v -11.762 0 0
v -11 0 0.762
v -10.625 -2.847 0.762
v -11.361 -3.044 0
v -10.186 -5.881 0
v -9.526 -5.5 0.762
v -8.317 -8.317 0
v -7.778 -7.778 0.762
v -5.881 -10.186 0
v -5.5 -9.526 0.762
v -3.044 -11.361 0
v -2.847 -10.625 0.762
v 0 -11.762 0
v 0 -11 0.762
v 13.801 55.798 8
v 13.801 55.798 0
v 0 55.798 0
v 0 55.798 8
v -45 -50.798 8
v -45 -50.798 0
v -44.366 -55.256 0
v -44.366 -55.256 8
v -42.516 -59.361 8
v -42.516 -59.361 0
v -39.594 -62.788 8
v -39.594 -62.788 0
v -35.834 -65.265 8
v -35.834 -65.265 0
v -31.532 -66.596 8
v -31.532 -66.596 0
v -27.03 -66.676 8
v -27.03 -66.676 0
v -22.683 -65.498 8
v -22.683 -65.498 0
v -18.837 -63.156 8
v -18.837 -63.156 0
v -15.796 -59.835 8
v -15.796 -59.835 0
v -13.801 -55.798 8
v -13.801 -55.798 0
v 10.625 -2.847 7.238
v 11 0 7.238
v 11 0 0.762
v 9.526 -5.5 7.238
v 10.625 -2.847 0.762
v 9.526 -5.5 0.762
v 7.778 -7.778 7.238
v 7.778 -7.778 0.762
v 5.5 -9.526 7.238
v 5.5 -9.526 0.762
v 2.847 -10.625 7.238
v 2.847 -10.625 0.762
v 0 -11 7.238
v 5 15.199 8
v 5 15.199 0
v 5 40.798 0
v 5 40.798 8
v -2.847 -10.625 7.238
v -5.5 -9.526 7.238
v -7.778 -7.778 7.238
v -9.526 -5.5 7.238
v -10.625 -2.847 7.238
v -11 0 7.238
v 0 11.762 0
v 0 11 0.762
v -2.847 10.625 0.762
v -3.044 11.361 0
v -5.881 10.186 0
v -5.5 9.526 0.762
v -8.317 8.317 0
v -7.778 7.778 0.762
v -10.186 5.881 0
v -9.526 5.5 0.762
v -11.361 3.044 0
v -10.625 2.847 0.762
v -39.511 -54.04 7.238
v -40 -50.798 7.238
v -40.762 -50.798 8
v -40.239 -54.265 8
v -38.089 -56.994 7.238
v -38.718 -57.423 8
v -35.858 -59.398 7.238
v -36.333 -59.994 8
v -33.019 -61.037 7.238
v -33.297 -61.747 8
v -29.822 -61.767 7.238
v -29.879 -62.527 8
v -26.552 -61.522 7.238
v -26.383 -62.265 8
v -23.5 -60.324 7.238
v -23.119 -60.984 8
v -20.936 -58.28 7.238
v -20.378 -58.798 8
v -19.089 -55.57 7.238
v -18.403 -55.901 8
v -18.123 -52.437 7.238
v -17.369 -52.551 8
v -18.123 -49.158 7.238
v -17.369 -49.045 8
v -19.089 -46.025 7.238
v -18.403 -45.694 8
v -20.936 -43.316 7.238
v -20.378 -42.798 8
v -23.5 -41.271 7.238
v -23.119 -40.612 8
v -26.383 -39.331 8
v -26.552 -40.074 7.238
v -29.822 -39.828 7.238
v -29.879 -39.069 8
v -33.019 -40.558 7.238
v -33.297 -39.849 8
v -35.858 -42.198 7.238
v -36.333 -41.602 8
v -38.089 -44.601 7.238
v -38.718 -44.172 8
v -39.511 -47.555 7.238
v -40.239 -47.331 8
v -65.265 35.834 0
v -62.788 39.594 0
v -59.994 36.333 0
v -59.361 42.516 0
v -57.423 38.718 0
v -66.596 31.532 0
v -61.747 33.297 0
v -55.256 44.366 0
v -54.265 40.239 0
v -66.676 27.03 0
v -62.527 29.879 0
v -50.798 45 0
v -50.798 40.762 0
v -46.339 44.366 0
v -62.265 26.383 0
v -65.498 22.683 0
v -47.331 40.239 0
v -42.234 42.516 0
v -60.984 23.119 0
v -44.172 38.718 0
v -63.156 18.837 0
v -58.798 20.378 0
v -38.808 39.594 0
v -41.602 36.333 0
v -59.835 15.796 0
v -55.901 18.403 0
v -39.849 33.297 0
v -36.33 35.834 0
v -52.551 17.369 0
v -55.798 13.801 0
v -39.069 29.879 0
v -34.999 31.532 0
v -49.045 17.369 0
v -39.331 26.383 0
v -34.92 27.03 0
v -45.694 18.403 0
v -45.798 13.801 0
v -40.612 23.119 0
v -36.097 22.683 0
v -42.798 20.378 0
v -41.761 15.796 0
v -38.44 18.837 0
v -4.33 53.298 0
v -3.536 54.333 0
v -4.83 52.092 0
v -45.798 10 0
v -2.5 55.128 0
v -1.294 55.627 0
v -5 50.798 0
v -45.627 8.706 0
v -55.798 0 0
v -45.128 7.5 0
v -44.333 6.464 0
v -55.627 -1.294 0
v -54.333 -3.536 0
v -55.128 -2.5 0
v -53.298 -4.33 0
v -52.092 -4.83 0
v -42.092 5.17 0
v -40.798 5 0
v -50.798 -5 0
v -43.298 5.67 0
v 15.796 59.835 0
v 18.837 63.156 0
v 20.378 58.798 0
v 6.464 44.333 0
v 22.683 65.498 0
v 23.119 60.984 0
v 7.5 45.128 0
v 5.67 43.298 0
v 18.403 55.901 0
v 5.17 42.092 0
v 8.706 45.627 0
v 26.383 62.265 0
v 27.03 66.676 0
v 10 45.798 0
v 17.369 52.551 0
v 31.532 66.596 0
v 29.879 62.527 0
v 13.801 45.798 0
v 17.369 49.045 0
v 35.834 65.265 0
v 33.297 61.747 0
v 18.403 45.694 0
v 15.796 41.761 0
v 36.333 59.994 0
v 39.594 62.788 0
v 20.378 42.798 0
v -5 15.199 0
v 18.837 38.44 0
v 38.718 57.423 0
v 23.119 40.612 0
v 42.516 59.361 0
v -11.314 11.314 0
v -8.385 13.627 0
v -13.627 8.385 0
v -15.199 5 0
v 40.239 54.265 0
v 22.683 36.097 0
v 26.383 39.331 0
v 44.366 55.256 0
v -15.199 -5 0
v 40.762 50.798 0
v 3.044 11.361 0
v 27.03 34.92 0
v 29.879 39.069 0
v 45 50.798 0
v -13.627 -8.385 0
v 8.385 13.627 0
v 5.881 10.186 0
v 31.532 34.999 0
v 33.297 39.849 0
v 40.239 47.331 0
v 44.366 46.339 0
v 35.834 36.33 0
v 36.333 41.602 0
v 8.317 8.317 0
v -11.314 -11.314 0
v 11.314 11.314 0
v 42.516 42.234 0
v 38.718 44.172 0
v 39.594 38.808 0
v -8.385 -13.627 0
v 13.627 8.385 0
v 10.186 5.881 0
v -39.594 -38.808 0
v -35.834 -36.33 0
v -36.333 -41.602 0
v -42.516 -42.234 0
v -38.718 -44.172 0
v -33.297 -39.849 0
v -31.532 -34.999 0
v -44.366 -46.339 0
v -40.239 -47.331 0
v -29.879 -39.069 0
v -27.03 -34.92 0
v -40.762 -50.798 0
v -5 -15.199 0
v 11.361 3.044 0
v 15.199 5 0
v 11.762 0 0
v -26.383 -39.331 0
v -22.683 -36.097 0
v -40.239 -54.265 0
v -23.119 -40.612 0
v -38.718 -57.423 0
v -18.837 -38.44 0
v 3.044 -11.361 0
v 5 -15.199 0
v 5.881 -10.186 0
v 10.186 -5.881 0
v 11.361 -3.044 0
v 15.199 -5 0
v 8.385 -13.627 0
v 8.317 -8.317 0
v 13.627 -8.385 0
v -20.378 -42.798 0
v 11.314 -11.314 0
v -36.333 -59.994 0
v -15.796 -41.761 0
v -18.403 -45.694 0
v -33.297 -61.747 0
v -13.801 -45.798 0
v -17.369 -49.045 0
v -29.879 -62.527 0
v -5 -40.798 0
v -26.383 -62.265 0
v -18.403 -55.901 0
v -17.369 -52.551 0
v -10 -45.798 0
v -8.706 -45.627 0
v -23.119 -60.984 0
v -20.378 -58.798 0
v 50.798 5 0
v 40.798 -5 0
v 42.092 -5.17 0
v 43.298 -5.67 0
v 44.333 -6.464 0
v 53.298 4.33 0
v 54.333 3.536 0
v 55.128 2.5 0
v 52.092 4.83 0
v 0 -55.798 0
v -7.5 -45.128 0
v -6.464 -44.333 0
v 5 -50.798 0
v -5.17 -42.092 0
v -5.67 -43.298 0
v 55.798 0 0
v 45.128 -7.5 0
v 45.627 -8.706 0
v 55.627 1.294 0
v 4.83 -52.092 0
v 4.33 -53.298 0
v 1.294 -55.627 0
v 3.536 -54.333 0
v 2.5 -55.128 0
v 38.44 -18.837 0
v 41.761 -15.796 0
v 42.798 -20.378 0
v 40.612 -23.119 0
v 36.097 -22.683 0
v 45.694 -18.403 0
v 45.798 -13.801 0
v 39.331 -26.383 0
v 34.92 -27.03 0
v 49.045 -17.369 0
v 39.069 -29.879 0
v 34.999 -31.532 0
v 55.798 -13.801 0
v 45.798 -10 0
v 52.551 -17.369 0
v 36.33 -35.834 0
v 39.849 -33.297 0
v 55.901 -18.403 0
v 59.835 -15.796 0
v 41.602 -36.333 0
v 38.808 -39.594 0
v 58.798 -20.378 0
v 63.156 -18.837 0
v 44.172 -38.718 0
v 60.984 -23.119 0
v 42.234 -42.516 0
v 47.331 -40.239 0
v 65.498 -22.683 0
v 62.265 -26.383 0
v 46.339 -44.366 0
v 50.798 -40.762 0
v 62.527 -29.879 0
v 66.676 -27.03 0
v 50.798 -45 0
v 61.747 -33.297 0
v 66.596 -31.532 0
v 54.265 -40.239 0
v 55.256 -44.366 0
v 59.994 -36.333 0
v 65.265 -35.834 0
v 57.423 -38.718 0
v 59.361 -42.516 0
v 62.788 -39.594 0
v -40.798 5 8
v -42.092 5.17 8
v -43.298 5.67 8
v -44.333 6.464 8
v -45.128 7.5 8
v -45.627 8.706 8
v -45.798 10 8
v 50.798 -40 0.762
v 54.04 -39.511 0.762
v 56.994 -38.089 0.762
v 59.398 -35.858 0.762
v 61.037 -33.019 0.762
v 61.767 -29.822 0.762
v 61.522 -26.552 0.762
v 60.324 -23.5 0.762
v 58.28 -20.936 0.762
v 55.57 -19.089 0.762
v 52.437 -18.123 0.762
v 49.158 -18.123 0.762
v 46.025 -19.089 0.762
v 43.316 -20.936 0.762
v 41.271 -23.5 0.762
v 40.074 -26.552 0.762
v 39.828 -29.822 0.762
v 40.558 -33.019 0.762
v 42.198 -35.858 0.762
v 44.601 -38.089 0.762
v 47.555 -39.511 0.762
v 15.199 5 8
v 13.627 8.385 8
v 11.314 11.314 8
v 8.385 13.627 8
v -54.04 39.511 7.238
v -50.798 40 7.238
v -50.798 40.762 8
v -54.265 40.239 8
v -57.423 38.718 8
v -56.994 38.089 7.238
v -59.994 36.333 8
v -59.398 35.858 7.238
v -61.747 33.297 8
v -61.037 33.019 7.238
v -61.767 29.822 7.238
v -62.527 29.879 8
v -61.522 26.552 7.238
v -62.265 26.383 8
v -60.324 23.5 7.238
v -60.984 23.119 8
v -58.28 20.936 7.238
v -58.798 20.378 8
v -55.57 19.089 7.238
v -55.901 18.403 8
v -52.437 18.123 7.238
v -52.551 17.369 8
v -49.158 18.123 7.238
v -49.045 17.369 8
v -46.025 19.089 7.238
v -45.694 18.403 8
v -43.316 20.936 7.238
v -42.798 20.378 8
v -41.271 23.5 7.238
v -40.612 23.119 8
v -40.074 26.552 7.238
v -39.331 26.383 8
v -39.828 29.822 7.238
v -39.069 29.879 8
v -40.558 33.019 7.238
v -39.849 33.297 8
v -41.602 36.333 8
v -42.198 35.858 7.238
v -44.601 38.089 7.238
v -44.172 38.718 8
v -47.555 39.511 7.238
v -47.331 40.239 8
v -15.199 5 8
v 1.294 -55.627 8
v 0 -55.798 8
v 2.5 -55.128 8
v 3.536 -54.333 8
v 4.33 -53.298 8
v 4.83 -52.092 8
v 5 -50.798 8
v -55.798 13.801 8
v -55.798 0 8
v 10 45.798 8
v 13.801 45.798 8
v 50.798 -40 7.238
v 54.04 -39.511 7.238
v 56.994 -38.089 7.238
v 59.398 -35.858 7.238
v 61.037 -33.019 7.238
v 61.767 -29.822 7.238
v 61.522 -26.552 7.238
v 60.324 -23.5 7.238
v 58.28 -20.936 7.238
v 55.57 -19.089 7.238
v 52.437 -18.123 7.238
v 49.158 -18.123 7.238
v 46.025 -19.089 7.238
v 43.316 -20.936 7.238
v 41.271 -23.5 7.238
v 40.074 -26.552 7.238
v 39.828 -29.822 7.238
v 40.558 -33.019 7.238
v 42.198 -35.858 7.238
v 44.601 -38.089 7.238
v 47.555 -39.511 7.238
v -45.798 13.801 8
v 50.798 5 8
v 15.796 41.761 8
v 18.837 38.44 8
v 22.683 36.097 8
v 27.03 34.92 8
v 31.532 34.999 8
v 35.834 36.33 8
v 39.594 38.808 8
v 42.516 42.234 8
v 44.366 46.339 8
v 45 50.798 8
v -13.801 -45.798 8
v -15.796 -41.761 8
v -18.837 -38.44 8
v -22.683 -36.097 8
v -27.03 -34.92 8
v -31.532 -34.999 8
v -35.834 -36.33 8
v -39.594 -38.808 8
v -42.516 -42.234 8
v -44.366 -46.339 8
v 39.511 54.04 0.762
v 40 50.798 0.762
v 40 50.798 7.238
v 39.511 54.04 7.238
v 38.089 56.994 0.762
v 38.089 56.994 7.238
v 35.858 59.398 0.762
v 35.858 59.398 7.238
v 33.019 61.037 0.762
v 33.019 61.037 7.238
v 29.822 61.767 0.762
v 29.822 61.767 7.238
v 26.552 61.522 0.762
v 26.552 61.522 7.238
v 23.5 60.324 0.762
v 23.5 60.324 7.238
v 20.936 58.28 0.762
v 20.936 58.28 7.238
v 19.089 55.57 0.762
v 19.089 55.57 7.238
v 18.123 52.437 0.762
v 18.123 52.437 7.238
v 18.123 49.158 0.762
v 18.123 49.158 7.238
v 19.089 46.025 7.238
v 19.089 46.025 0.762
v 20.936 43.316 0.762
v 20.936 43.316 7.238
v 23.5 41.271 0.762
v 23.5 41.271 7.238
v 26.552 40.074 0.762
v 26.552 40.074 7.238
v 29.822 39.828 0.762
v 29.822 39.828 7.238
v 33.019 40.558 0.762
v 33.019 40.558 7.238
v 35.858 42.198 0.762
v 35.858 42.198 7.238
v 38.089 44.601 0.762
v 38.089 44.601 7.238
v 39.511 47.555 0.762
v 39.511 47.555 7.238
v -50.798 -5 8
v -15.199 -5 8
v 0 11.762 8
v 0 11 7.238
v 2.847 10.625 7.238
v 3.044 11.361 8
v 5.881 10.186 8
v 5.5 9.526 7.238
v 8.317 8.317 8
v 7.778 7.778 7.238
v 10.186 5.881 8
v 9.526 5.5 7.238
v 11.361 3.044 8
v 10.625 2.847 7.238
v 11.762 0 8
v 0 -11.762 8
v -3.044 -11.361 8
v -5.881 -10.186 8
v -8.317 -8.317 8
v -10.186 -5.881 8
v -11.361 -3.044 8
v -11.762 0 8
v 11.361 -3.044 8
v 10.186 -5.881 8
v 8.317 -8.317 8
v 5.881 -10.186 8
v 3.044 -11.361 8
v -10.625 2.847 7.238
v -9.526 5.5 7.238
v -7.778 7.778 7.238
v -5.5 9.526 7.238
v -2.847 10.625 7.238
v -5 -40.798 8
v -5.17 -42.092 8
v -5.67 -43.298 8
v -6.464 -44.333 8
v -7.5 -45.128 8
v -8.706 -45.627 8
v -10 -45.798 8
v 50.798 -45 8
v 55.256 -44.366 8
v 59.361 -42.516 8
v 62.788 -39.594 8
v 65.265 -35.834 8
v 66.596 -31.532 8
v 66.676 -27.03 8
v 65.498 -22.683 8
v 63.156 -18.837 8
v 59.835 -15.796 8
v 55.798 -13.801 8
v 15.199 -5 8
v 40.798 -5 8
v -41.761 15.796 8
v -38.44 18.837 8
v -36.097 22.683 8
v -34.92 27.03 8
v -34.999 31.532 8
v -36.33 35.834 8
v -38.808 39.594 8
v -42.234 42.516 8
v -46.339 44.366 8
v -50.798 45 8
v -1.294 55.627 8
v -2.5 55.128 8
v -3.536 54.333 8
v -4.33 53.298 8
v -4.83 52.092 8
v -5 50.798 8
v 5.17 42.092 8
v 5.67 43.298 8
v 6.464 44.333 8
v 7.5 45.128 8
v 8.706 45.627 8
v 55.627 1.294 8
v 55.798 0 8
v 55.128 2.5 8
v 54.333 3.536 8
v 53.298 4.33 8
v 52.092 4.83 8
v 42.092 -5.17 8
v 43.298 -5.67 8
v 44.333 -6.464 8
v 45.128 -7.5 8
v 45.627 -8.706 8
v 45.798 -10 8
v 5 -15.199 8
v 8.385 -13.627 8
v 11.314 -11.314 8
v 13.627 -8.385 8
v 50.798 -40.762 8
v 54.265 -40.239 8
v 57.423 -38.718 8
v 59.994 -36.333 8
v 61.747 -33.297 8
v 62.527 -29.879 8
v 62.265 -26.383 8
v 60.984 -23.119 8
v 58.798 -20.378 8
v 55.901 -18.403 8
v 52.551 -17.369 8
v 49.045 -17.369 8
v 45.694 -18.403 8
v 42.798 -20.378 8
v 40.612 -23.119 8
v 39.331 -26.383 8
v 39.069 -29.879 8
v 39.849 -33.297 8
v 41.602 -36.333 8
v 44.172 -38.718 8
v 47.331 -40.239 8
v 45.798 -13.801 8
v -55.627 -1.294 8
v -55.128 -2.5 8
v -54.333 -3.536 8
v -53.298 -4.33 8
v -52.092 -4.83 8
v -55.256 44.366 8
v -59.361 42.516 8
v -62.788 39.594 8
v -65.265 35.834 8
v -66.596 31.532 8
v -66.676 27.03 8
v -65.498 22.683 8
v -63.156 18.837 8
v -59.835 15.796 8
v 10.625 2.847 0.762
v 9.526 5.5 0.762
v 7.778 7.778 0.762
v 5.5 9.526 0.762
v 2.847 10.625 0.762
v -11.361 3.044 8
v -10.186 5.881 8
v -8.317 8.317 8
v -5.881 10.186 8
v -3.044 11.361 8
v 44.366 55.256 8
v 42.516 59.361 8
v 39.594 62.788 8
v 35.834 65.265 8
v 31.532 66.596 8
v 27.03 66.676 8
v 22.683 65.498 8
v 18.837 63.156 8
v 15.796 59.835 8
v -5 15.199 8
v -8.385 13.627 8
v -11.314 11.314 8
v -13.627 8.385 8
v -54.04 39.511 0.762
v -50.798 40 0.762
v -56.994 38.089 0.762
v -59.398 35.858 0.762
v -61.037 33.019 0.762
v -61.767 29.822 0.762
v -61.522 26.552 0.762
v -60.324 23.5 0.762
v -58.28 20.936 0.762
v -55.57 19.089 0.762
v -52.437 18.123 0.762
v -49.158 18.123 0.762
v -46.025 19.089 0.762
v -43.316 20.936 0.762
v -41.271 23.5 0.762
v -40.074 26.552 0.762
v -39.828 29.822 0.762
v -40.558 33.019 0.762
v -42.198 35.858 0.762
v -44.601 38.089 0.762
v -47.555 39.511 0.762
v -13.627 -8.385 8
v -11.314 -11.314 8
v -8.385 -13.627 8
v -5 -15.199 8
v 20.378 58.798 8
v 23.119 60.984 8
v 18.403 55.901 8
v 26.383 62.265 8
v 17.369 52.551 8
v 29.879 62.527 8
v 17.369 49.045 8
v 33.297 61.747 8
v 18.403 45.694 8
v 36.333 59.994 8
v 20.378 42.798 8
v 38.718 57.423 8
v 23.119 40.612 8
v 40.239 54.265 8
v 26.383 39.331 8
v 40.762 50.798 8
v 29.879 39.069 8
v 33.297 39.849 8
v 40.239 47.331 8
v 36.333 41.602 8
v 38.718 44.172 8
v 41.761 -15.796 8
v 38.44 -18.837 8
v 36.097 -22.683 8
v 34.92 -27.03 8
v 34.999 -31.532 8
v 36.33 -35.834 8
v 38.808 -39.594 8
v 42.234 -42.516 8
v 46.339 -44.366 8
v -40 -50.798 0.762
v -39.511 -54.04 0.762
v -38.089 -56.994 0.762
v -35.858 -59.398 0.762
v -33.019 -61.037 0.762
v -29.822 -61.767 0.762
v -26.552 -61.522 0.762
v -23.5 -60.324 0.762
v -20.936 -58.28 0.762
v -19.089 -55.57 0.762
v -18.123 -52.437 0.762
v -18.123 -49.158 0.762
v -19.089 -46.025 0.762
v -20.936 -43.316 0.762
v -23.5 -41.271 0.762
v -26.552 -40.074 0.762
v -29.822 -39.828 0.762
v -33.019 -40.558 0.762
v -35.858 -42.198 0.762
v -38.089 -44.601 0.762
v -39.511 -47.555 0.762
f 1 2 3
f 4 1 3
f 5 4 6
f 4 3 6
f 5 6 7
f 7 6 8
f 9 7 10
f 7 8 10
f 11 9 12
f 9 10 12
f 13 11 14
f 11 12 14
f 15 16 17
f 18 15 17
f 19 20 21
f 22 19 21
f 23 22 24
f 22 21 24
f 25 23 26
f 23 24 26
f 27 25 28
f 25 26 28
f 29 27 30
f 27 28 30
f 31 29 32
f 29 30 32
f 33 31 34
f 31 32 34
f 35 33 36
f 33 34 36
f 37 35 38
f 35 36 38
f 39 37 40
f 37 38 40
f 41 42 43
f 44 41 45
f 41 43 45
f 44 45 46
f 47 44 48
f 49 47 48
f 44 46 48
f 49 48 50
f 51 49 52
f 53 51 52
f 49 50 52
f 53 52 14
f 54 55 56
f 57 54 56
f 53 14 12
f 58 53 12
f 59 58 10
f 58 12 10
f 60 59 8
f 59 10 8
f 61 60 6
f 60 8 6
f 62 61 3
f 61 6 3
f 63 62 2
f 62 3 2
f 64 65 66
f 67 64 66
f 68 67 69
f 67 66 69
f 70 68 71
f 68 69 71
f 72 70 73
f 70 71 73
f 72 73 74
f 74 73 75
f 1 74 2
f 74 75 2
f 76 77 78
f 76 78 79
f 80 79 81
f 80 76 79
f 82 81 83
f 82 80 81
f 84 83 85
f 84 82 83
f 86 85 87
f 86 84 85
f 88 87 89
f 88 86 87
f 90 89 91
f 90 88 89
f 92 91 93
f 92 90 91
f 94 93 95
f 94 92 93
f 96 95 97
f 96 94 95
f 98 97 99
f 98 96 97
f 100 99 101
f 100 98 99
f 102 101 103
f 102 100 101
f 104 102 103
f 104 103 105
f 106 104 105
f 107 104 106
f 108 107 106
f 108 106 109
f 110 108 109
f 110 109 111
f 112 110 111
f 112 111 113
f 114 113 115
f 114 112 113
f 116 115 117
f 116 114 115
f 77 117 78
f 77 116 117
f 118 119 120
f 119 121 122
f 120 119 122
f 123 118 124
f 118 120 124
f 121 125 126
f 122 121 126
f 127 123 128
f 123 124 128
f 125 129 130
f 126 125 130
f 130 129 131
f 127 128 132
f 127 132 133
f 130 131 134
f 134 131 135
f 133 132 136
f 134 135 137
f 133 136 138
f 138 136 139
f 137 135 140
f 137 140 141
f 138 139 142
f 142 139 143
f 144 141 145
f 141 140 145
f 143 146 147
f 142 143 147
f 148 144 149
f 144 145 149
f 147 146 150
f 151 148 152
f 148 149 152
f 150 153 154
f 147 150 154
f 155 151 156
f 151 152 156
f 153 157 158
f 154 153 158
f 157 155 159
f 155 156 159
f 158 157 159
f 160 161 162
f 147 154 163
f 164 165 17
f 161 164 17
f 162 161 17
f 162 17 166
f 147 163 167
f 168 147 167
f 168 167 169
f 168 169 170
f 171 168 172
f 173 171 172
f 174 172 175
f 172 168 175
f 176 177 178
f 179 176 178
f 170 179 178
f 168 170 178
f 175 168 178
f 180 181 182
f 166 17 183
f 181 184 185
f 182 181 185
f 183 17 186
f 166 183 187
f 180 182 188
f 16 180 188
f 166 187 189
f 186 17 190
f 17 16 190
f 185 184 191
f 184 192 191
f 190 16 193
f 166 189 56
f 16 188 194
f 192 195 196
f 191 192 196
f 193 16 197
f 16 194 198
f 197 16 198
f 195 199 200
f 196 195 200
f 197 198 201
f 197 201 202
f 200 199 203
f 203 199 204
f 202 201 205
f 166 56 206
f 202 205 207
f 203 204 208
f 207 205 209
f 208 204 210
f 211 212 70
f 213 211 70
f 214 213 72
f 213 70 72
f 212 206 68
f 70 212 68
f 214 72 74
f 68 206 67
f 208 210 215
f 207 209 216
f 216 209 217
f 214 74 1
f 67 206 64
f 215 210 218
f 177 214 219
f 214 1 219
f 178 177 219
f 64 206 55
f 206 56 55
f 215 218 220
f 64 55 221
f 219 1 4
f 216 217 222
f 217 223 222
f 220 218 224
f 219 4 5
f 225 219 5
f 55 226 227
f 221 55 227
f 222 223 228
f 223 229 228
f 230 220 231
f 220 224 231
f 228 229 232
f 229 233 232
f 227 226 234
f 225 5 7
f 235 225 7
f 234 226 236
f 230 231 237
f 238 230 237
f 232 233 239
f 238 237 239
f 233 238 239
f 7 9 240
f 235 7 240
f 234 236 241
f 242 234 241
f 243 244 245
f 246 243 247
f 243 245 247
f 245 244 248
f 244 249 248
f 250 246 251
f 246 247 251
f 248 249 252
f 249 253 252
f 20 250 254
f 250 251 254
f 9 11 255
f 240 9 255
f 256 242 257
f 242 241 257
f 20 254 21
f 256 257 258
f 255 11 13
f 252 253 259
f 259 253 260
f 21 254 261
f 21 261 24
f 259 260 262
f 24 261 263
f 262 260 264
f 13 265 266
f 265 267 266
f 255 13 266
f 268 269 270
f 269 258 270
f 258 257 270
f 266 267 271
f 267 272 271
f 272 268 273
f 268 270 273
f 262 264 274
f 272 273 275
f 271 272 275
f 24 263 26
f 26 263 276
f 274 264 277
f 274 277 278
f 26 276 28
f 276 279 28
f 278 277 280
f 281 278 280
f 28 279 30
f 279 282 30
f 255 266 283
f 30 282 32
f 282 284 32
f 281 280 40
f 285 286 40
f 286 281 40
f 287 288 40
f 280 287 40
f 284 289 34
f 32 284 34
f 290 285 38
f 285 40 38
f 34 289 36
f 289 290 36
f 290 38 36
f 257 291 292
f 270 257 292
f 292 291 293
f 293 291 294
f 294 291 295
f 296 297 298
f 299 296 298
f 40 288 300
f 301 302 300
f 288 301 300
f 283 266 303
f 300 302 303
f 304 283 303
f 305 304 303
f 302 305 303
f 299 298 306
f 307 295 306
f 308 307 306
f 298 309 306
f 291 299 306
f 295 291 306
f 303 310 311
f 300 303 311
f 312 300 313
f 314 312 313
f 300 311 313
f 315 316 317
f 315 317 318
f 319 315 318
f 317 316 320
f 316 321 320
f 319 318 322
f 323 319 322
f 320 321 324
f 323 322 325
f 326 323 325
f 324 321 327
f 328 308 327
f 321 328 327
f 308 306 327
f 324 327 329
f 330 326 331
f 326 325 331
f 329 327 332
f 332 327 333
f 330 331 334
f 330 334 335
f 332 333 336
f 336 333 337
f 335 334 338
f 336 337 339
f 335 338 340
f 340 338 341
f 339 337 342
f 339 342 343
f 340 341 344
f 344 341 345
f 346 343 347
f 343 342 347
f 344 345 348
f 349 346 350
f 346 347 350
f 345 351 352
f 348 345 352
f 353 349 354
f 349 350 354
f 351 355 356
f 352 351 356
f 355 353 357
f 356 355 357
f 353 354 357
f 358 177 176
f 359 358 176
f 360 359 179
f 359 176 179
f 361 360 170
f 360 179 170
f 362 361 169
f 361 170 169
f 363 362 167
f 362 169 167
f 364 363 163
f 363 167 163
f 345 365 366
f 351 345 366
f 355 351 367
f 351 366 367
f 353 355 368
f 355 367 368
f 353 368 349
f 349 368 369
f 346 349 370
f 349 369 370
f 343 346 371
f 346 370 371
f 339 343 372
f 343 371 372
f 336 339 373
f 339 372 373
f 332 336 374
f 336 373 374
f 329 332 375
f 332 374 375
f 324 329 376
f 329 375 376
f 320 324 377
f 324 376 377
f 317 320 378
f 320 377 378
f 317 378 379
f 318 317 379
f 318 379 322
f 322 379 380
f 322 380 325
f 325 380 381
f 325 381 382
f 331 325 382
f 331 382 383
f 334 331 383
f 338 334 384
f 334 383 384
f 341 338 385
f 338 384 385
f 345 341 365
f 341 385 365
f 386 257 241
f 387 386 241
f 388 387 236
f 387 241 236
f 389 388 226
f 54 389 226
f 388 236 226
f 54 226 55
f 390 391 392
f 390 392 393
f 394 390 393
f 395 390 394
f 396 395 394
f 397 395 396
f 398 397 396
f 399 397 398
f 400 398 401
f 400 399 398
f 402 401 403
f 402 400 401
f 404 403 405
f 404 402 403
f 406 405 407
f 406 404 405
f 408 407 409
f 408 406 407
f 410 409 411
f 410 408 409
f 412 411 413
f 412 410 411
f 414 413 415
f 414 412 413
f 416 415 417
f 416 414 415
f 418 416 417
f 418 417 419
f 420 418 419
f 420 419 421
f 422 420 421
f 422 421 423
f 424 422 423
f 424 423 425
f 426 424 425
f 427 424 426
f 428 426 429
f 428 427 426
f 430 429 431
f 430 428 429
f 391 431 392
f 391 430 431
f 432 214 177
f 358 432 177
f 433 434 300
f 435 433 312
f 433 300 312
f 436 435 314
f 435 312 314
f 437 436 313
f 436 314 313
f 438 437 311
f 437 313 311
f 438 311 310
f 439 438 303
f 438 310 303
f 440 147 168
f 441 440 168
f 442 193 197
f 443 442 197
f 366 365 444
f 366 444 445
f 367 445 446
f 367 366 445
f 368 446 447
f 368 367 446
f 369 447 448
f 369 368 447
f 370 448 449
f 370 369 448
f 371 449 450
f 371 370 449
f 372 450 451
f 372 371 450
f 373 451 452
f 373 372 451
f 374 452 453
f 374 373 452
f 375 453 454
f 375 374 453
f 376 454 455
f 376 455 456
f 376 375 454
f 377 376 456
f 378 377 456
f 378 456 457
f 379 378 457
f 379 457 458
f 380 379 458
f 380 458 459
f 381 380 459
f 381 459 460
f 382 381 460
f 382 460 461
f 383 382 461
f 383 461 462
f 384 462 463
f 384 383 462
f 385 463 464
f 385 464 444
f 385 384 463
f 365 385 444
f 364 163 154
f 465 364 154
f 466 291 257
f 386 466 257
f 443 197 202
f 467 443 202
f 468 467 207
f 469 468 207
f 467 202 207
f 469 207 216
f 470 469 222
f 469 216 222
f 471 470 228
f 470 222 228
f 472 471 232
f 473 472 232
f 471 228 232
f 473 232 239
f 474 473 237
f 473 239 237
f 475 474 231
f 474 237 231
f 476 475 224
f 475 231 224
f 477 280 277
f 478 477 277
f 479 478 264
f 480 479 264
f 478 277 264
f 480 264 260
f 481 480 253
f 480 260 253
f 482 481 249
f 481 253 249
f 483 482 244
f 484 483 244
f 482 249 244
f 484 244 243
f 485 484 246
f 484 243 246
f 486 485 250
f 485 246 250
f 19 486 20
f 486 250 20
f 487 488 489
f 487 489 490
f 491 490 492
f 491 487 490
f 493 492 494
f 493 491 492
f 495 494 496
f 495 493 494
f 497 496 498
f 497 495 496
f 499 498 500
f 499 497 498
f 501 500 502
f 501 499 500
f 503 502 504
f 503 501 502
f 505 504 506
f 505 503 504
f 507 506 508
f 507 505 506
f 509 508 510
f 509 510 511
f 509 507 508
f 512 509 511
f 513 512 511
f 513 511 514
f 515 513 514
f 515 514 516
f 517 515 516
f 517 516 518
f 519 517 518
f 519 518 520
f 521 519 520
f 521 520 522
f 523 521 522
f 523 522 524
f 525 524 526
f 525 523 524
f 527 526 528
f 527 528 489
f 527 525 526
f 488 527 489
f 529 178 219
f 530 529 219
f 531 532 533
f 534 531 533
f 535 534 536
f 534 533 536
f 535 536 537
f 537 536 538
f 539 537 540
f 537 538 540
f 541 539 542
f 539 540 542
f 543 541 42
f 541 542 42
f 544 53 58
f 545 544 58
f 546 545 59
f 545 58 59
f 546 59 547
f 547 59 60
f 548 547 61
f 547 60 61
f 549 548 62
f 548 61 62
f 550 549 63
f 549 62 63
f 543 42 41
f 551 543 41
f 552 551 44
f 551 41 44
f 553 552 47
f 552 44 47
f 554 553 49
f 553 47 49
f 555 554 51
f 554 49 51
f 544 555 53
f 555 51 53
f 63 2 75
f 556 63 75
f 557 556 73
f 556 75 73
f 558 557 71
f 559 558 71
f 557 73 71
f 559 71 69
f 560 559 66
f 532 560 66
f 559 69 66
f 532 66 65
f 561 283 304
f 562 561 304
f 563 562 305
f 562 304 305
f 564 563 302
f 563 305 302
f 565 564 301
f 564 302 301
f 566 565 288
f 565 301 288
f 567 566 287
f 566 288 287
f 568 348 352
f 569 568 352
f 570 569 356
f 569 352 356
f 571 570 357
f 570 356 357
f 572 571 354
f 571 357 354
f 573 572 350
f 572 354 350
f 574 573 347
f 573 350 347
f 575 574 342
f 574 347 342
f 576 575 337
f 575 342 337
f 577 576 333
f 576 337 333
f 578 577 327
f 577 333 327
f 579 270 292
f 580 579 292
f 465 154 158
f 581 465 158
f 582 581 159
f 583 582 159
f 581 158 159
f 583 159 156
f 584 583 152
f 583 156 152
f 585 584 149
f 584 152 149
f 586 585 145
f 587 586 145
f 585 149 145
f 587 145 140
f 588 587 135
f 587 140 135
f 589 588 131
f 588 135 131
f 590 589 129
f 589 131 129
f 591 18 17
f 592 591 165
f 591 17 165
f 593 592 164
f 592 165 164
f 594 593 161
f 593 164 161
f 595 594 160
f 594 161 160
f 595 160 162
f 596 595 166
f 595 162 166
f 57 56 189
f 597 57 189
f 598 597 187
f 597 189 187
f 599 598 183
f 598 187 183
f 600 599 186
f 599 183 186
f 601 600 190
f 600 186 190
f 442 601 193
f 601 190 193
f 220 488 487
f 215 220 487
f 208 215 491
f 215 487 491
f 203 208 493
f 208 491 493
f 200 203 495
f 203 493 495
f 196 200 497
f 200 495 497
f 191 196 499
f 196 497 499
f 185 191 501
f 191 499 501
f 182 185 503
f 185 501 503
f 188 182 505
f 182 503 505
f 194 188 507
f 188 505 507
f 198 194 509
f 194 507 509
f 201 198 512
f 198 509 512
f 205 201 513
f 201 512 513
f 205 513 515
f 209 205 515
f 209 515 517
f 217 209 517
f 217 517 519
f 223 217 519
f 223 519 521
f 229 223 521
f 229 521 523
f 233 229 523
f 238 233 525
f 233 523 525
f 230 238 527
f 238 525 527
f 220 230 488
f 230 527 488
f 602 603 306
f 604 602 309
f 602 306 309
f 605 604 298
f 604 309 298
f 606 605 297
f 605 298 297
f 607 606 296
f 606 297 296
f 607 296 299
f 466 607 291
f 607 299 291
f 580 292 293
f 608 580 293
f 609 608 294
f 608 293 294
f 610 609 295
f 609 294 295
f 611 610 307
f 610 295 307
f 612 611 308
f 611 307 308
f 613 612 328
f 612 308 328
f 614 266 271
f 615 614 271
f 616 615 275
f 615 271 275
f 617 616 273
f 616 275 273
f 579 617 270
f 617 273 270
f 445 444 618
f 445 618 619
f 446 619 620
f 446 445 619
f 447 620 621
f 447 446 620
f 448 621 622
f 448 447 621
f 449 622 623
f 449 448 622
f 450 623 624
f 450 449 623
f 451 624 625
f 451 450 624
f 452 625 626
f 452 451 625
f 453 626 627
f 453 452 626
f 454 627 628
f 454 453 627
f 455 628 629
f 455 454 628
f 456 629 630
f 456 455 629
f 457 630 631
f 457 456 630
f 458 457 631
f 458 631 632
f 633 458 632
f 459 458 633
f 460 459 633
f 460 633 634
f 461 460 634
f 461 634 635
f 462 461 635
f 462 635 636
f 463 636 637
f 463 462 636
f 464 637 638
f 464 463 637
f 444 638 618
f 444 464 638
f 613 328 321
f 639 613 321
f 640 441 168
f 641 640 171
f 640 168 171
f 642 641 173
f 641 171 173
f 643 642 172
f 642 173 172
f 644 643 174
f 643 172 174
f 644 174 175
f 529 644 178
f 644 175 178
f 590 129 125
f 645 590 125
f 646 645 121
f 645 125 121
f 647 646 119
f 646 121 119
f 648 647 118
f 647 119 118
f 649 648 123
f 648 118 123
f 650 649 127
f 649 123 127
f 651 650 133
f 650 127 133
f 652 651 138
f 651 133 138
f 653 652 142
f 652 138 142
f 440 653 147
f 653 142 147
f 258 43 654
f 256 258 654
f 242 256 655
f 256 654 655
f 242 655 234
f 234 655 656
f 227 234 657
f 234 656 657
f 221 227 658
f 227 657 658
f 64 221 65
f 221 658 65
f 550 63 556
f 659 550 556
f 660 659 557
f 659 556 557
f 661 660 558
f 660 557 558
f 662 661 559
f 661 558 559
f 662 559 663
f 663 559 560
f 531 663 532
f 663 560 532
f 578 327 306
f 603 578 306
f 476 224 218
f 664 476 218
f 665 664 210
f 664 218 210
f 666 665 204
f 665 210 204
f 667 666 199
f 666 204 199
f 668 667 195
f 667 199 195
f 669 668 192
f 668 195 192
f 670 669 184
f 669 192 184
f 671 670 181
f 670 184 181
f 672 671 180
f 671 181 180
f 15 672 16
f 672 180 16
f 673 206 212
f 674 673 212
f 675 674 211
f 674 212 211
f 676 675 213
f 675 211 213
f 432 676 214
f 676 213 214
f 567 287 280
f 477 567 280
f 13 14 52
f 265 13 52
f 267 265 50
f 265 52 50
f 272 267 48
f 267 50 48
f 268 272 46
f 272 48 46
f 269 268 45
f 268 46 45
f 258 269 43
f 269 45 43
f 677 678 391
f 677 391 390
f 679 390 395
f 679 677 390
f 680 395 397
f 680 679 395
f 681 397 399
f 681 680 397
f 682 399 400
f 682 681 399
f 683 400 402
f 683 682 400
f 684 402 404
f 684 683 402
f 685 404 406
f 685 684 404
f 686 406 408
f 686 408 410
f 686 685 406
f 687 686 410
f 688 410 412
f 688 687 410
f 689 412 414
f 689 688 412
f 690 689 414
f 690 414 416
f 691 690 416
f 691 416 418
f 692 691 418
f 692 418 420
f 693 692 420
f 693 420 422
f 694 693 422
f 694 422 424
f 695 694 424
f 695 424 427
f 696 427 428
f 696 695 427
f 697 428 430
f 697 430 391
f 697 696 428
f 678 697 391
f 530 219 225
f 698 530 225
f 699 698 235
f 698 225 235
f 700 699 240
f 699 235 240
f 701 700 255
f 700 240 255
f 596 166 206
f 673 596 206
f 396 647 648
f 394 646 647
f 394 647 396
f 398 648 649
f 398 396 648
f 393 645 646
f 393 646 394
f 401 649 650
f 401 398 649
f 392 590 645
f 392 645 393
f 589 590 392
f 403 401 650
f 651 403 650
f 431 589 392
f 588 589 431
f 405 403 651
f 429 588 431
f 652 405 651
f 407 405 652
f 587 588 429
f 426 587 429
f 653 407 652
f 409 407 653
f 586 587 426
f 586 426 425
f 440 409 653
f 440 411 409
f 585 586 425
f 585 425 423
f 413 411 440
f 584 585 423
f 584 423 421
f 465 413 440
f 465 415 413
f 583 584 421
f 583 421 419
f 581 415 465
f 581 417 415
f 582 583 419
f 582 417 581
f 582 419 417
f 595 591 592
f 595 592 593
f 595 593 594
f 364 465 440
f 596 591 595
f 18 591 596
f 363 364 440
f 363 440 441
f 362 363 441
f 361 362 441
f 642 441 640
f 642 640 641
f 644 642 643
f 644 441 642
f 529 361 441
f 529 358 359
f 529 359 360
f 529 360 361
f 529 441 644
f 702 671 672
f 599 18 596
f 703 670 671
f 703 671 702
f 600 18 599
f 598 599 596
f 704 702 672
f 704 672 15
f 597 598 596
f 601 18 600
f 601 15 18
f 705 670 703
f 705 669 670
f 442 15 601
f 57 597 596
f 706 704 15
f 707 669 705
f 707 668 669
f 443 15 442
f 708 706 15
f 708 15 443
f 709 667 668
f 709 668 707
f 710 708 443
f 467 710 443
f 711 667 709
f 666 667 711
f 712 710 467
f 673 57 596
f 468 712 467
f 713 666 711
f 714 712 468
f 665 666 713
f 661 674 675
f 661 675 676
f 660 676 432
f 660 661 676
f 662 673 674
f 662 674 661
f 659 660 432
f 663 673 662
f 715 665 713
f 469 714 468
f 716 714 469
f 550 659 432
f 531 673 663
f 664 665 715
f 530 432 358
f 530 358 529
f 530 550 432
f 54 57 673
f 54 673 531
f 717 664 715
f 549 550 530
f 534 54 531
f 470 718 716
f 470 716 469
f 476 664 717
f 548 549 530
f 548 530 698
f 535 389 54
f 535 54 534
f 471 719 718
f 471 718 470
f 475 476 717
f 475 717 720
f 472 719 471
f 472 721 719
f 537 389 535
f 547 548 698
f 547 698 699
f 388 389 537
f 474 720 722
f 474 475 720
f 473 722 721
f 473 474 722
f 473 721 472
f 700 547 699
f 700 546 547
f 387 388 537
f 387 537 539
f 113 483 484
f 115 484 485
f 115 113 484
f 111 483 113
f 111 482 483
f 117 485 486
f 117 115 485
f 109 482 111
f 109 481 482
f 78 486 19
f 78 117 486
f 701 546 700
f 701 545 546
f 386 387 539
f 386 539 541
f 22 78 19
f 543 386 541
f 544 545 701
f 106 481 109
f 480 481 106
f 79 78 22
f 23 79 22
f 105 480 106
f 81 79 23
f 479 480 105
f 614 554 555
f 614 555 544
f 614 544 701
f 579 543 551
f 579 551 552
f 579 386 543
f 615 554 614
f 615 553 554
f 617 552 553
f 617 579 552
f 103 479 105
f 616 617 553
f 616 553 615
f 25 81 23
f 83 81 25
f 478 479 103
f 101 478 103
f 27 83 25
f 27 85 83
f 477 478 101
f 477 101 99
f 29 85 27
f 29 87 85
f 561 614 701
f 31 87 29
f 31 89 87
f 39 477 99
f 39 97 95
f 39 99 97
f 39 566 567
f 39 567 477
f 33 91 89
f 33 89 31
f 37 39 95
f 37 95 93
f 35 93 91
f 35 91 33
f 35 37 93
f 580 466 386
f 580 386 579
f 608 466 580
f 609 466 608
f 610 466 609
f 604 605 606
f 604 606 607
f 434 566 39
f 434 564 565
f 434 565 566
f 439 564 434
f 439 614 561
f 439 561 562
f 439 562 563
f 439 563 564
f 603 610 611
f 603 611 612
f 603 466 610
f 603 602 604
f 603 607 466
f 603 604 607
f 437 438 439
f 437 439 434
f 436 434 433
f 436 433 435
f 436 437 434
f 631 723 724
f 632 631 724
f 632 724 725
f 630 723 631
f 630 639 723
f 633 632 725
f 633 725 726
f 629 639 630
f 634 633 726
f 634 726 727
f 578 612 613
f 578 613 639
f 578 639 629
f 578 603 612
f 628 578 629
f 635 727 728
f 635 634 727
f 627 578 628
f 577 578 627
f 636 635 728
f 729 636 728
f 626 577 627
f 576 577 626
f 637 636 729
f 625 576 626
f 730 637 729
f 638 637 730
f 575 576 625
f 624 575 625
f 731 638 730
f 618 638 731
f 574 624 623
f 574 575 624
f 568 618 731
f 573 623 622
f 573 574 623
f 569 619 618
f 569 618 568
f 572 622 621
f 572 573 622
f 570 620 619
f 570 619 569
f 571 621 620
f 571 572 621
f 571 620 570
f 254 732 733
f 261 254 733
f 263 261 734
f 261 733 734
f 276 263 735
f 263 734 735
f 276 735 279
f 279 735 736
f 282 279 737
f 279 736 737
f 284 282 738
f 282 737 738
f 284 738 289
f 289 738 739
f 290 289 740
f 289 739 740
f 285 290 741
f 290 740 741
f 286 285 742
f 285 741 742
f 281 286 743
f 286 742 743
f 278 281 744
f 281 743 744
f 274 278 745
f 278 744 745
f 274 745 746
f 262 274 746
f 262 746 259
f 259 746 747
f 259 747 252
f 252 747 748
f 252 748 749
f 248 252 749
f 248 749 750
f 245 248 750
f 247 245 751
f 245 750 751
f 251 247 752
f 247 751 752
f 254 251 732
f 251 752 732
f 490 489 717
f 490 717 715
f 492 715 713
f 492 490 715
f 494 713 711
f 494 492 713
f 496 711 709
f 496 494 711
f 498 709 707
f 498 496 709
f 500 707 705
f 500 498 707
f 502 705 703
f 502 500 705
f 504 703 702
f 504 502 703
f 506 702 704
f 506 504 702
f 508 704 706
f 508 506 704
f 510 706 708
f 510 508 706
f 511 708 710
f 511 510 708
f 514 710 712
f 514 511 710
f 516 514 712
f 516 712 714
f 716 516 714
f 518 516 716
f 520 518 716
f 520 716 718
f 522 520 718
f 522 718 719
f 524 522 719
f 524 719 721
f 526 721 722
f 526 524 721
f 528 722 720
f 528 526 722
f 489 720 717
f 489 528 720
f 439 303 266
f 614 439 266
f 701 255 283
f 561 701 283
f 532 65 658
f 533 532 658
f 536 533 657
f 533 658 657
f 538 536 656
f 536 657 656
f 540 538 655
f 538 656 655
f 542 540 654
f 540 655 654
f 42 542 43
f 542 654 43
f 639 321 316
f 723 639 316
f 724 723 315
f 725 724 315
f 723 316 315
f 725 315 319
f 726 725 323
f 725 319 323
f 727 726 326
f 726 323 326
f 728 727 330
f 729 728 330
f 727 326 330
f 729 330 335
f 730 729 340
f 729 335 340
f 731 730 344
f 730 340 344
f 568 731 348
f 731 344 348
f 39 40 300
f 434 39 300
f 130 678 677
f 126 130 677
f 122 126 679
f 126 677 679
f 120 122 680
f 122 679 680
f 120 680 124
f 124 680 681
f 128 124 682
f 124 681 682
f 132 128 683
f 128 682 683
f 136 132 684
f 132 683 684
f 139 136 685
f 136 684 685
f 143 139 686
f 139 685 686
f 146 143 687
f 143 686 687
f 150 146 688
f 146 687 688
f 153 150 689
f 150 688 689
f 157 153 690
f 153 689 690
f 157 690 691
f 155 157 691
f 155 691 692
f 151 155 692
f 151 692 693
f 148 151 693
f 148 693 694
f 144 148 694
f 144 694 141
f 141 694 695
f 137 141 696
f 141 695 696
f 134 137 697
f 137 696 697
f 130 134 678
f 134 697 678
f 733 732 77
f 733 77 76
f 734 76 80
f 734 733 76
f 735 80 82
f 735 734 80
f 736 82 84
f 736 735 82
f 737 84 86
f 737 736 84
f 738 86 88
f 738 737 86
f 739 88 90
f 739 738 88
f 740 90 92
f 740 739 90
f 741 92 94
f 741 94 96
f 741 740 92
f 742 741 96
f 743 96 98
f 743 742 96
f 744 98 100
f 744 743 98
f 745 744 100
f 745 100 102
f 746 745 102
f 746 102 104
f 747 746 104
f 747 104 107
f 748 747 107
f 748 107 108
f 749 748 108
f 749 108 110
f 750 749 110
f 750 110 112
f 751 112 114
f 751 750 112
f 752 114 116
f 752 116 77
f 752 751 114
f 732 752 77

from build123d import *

# Parameters (mm, degrees)
F0_R     = 11
F1_DEPTH = 8
F3_COUNT = 4
F4_SIZE  = 0.762


# Not quite as in the source:
# - a feature names something its author has since deleted; it is built from what else it names


with BuildPart() as f1:
    # F0 (on Top) → F1 (new body)
    with BuildSketch(Plane.XY):
        with BuildLine():
            ThreePointArc((13.801315615, 55.7977184653), (13.2015990543, 53.3296207755), (13.0000001118, 50.7977195084))
            ThreePointArc((13.0000001118, 50.7977195084), (13.2015991411, 48.2658176992), (13.8013159582, 45.7977195084))
            ThreePointArc((13.8013159582, 45.7977195084), (31.531901921, 34.9993185378), (45.0000001118, 50.7977195084))
            ThreePointArc((45.0000001118, 50.7977195084), (31.5319013788, 66.5961205659), (13.801315615, 55.7977184653))
        make_face()
        with Locations((29.0000001118, 50.7977195084)):
            Circle(F0_R, mode=Mode.SUBTRACT)
        with BuildLine():
            Line((0, 50.7977195084), (0, 16))
            ThreePointArc((0, 16), (2.5319018092, 15.7984009706), (5, 15.1986841536))
            Line((5, 15.1986841536), (5, 40.7977195084))
            ThreePointArc((5, 40.7977195084), (6.4644660941, 44.3332534143), (10, 45.7977195084))
            Line((10, 45.7977195084), (13.8013159582, 45.7977195084))
            ThreePointArc((13.8013159582, 45.7977195084), (13.2015991411, 48.2658176992), (13.0000001118, 50.7977195084))
            Line((13.0000001118, 50.7977195084), (0, 50.7977195084))
        make_face()
        with BuildLine():
            ThreePointArc((-4.9999998882, 15.1986841903), (-2.5319017511, 15.7984009799), (0, 16))
            Line((0, 16), (0, 50.7977195084))
            Line((0, 50.7977195084), (13.0000001118, 50.7977195084))
            ThreePointArc((13.0000001118, 50.7977195084), (13.2015990543, 53.3296207755), (13.801315615, 55.7977184653))
            Line((13.801315615, 55.7977184653), (1.118e-07, 55.7977184653))
            ThreePointArc((1.118e-07, 55.7977184653), (-3.5355337942, 54.3332523713), (-4.9999998882, 50.7977184653))
            Line((-4.9999998882, 50.7977184653), (-4.9999998882, 15.1986841903))
        make_face()
        with BuildLine():
            ThreePointArc((5, 15.1986841536), (2.5319018092, 15.7984009706), (0, 16))
            ThreePointArc((0, 16), (-2.5319017511, 15.7984009799), (-4.9999998882, 15.1986841903))
            ThreePointArc((-4.9999998882, 15.1986841903), (-9.3808315673, -12.9614813623), (16, 0))
            ThreePointArc((16, 0), (12.9614813968, 9.3808315196), (5, 15.1986841536))
        make_face()
        with BuildLine():
            ThreePointArc((0, 11), (7.7781745931, 7.7781745931), (11, 0))
            ThreePointArc((11, 0), (-7.7781745931, -7.7781745931), (0, 11))
        make_face(mode=Mode.SUBTRACT)
    extrude(amount=F1_DEPTH)

    # F3: F1 ×4 about axis
    f3_axis = Axis((0, 0, 23.9773858339), (0, 0, 1))


with BuildPart() as f1_1:
    add(f1.part)
    for i in range(1, F3_COUNT):
        add(f1.part.rotate(f3_axis, i * 360 / F3_COUNT))

    # F4
    f4_edges = [f1_1.edges().sort_by_distance(p)[0] for p in [
        (-18, -50.79772, 8),
        (-50.79772, 18, 8),
        (18, 50.79772, 8),
        (50.79772, -18, 8),
        (0, -11, 8),
        (50.79772, -18, 0),
        (18, 50.79772, 0),
        (-50.79772, 18, 0),
        (0, -11, 0),
        (-18, -50.79772, 0),
    ]]
    chamfer(f4_edges, length=F4_SIZE)


solid = f1_1.part
